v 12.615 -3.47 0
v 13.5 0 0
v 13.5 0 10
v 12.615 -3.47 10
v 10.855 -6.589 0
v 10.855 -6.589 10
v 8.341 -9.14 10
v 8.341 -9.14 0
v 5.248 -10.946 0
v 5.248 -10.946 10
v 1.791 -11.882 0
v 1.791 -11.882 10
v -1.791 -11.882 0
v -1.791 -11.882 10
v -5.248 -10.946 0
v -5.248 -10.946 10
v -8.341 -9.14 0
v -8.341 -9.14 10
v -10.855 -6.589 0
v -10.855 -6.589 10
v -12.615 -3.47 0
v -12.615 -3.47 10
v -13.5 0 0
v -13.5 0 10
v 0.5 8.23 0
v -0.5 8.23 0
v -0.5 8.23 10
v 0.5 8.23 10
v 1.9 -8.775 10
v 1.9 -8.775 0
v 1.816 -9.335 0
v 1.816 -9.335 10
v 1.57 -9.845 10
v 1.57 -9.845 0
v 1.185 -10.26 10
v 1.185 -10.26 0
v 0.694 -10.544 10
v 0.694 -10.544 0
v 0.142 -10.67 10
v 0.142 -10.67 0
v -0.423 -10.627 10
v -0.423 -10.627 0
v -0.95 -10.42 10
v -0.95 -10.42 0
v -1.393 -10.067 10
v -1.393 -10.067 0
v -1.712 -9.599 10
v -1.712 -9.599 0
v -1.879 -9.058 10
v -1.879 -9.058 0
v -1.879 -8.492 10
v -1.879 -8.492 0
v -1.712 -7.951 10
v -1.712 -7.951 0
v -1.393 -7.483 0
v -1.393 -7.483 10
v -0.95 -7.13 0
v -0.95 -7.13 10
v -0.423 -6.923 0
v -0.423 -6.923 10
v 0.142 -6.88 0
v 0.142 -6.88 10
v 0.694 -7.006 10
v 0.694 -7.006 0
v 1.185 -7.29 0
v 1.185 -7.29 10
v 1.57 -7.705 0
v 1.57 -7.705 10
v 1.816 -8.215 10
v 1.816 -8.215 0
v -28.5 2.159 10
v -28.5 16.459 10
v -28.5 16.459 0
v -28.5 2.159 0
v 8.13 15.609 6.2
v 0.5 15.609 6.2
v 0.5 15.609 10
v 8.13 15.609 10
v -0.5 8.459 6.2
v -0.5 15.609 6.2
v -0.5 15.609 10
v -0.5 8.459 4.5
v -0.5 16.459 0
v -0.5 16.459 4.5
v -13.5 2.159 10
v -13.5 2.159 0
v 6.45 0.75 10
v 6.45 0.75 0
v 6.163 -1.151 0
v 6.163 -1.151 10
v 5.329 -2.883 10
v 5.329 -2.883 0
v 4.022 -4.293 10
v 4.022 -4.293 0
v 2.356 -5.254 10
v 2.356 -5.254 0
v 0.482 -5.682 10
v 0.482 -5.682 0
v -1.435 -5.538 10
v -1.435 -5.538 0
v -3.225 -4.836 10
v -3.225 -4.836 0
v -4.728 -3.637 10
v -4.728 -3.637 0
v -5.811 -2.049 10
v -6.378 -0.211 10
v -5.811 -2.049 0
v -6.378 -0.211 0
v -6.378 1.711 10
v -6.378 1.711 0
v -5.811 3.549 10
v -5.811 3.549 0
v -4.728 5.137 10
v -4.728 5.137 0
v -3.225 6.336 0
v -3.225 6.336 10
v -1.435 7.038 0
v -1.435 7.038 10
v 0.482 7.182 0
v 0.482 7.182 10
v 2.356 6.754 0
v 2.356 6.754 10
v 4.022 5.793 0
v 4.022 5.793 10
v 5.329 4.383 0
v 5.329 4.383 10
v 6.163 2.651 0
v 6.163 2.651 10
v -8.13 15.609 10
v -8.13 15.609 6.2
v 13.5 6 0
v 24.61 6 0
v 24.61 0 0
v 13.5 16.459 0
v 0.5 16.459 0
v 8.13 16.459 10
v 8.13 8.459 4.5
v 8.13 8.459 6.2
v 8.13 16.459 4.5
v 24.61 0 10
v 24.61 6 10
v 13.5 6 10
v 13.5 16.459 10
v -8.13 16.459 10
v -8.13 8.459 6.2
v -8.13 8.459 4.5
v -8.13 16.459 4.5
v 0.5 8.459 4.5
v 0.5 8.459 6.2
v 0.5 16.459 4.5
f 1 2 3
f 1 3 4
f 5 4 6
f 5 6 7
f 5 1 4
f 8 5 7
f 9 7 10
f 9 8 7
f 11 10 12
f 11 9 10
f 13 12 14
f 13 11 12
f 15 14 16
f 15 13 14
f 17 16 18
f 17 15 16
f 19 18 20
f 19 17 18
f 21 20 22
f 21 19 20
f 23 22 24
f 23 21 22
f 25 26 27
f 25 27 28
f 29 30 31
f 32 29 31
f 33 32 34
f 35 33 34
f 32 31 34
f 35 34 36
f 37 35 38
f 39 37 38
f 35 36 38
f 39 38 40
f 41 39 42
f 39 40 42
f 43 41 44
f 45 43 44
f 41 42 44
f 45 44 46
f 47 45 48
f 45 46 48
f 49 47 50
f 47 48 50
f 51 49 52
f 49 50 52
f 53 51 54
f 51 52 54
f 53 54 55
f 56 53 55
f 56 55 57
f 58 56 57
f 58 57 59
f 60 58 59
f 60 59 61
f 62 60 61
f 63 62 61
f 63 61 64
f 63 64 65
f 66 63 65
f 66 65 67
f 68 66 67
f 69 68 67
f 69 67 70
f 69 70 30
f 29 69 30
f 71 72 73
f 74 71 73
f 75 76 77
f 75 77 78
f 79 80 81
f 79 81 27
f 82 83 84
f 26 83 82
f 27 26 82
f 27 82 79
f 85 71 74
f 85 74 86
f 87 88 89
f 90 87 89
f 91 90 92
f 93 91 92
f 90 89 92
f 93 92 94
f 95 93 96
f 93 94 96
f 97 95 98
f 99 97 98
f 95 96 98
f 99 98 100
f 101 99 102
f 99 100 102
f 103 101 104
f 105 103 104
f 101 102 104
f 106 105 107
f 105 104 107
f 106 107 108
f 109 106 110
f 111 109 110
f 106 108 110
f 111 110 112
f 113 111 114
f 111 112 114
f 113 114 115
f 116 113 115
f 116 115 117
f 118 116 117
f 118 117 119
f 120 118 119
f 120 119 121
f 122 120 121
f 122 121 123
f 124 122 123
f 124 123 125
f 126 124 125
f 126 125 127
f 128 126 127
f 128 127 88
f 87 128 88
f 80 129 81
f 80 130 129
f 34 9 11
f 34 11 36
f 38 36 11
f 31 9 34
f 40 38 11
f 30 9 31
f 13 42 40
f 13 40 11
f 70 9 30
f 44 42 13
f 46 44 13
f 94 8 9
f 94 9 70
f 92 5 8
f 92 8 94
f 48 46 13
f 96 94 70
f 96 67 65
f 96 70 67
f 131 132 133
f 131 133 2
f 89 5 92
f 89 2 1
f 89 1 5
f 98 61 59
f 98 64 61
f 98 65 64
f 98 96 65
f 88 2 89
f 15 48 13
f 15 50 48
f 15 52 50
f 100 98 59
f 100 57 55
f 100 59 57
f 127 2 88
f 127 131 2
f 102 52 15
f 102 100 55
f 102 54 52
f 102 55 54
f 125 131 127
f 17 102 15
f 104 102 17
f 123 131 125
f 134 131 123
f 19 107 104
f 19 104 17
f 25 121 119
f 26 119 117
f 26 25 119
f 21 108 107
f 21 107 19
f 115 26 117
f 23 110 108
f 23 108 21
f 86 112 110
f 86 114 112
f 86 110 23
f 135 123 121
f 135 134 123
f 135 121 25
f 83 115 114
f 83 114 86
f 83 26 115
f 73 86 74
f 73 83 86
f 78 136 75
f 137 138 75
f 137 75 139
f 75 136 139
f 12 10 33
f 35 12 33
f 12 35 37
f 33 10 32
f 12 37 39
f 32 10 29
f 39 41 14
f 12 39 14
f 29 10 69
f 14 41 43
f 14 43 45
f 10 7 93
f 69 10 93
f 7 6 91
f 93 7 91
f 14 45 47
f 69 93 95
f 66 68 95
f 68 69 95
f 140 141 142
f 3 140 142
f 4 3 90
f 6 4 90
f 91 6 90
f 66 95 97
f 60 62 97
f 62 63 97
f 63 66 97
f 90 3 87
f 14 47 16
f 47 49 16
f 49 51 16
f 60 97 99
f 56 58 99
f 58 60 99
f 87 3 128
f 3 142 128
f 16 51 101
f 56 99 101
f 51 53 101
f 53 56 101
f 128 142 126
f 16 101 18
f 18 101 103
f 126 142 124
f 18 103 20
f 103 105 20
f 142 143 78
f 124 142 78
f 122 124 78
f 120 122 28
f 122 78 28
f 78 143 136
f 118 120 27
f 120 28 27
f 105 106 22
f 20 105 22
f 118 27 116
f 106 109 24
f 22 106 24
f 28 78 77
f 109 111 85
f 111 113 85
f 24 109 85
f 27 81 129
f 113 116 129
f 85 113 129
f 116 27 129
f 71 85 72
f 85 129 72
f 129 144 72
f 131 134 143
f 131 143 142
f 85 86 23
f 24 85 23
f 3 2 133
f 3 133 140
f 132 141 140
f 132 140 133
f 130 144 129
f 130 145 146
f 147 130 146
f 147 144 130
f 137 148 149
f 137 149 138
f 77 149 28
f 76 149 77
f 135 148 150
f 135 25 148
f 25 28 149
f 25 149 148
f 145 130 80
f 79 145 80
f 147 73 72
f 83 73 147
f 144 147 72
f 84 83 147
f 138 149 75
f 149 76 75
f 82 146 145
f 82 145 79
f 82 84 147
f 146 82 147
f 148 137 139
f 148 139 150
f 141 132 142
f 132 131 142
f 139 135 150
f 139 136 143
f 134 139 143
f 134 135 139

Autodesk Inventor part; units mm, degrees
ref_plane "YZ Plane" through (0, 0, 0) normal (1, 0, 0) x (0, 1, 0)
ref_plane "XZ Plane" through (0, 0, 0) normal (0, 1, 0) x (-1, 0, 0)
ref_plane "XY Plane" through (0, 0, 0) normal (0, 0, 1) x (1, 0, 0)
sketch "Sketch1" plane through (0, 0, 0) normal (0, 0, 1) x (1, 0, 0)
  circle A0 centre (0, 0.75) radius 6.45
  circle A1 centre (0, -8.775) radius 1.9
  line L0 (-18.9, 0) -> (18.9, 0) construction
  line L1 (0, -17.6918) -> (0, 22.1508) construction
  line L2 (-0.5, 16.459) -> (-0.5, 8.23)
  line L3 (-0.5, 8.23) -> (0.5, 8.23)
  line L4 (0.5, 8.23) -> (0.5, 16.4588)
  line L5 (-12.7, 16.459) -> (-0.5, 16.459)
  line L6 (0.5, 16.4588) -> (12.7, 16.4588)
  line L7 (-12.7, 16.459) -> (-13.5, 16.459)
  line L8 (12.7, 16.4588) -> (13.5, 16.4588)
  line L9 (13.5, 16.4588) -> (13.5, 0)
  line L10 (-13.5, 16.459) -> (-13.5, 0)
  arc A2 (-13.5, 0) -> (13.5, 0) centre (0, 1.5937) ccw
  dimension "d0" = 12.9
  dimension "d1" = 3.8
  dimension "d11" = 1
  dimension "d33" = 0.8
  dimension "d34" = 0.8
  dimension "d35" = 27
  dimension "d36" = 13
  dimension "d37" = 13.5
  dimension "d40" = 15.709
  dimension "d44" = 13.5938
  dimension "d45" = 9.525
  dimension "d47" = 15.7088
  dimension "d54" = 7.48
  dimension "d55" = 6.6363
extrude "Extrusion1" add sketch "Sketch1" along normal blind 10
sketch "Sketch2" plane through (0.5, 16.4588, 0) normal (0, 1, 0) x (1, 0, 0)
  line L0 (0, 0) -> (0, -10) projected
  line L1 (0, -10) -> (7.63, -10)
  line L2 (7.63, -10) -> (7.63, -6.2)
  line L3 (7.63, -6.2) -> (0, -6.2)
  line L4 (0, -6.2) -> (0, -10)
  line L5 (-1, -10) -> (-14, -10) projected
  line L6 (-1, -10) -> (-8.63, -10)
  line L7 (-8.63, -10) -> (-8.63, -6.2)
  line L8 (-8.63, -6.2) -> (-1, -6.2)
  line L9 (-1, -6.2) -> (-1, -10)
  line L10 (-8.63, -6.2) -> (7.63, -6.2)
  line L11 (7.63, -6.2) -> (7.63, -4.5)
  line L12 (7.63, -4.5) -> (-8.63, -4.5)
  line L13 (-8.63, -4.5) -> (-8.63, -6.2)
  point P0 (-0.5, 0)
  point P1 (-13.2, -10)
  point P2 (7.63, -6.2)
  point P3 (-8.63, -10)
  dimension "d18" = 7.63
  dimension "d19" = 3.8
  dimension "d20" = 7.63
  dimension "d21" = 3.8
  dimension "d22" = 1.7
extrude "Extrusion2" cut sketch "Sketch2" against normal blind 8 contours L10 L8 L13 L12 L0 | L0 L12 L11 L3
extrude "Extrusion3" cut sketch "Sketch2" against normal blind 0.85 contours L3 L2 L1 L0 | L9 L5 L7 L8
sketch "Sketch4" plane through (13.5, 0, 0) normal (1, 0, 0) x (0, 0, -1)
  line L0 (0, 0) -> (-10, 0) projected
  line L1 (0, 0) -> (0, 16.4588) projected
  line L2 (-10, 0) -> (0, 0)
  line L3 (0, 0) -> (0, 6)
  line L4 (0, 6) -> (-10, 6)
  line L5 (-10, 6) -> (-10, 0)
  dimension "d56" = 6
extrude "Extrusion5" add sketch "Sketch4" along normal blind 11.11
sketch "Sketch5" plane through (-13.5, 16.459, 0) normal (0, 1, 0) x (1, 0, 0)
  point P0 (13.5, 0)
sketch "Sketch6" plane through (-13.5, 16.459, 0) normal (0, 1, 0) x (1, 0, 0)
  line L0 (5.37, -6.2) -> (5.37, -4.5) projected
  line L1 (13, 0) -> (13, -10) projected
  line L2 (5.37, -6.2) -> (13, -6.2)
  line L3 (13, -6.2) -> (13, -10)
  line L4 (13, -10) -> (5.37, -10)
  line L5 (5.37, -10) -> (5.37, -6.2)
  line L6 (5.37, -4.5) -> (13, -4.5) projected
  line L7 (5.37, -6.2) -> (13, -6.2)
  line L8 (13, -6.2) -> (13, -4.5)
  line L9 (13, -4.5) -> (5.37, -4.5)
  line L10 (5.37, -4.5) -> (5.37, -6.2)
  point P0 (13.5, 0)
extrude "Extrusion6" cut sketch "Sketch6" against normal up to surface (0.8502 mm away) contours L2 L1 L4 L5
extrude "Extrusion7" cut sketch "Sketch6" against normal blind 8 contours L0 L6 L1 L2
sketch "Sketch7" plane through (-13.5, 0, 0) normal (-1, 0, 0) x (0, 0, 1)
  line L0 (0, 16.459) -> (10, 16.459) projected
  line L1 (10, 16.459) -> (10, 0) projected
  line L2 (0, 16.459) -> (10, 16.459)
  line L3 (10, 16.459) -> (10, 9.159)
  line L4 (10, 9.159) -> (0, 9.159)
  line L5 (0, 9.159) -> (0, 16.459)
  point P0 (0, 0)
  dimension "d63" = 7.3
extrude "Extrusion8" add sketch "Sketch7" along normal blind 14
sketch "Sketch8" plane through (-13.5, 9.159, 0) normal (0, -1, 0) x (1, 0, 0)
  line L0 (13, 0) -> (-14, 0) projected
  line L1 (27, 10) -> (0, 10) projected
  line L2 (-14, 0) -> (0, 0)
  line L3 (0, 0) -> (0, 10)
  line L4 (0, 10) -> (-14, 10)
  line L5 (-14, 10) -> (-14, 0)
  point P0 (13.5, 0)
extrude "Extrusion9" add sketch "Sketch8" along normal blind 7
move faces "Move1" translate (-1, 0, 0) faces at (-27.5, 11.6923, 6.6667)
properties part number "Prowadnica_tloka" material "PC/ABS Plastic"
